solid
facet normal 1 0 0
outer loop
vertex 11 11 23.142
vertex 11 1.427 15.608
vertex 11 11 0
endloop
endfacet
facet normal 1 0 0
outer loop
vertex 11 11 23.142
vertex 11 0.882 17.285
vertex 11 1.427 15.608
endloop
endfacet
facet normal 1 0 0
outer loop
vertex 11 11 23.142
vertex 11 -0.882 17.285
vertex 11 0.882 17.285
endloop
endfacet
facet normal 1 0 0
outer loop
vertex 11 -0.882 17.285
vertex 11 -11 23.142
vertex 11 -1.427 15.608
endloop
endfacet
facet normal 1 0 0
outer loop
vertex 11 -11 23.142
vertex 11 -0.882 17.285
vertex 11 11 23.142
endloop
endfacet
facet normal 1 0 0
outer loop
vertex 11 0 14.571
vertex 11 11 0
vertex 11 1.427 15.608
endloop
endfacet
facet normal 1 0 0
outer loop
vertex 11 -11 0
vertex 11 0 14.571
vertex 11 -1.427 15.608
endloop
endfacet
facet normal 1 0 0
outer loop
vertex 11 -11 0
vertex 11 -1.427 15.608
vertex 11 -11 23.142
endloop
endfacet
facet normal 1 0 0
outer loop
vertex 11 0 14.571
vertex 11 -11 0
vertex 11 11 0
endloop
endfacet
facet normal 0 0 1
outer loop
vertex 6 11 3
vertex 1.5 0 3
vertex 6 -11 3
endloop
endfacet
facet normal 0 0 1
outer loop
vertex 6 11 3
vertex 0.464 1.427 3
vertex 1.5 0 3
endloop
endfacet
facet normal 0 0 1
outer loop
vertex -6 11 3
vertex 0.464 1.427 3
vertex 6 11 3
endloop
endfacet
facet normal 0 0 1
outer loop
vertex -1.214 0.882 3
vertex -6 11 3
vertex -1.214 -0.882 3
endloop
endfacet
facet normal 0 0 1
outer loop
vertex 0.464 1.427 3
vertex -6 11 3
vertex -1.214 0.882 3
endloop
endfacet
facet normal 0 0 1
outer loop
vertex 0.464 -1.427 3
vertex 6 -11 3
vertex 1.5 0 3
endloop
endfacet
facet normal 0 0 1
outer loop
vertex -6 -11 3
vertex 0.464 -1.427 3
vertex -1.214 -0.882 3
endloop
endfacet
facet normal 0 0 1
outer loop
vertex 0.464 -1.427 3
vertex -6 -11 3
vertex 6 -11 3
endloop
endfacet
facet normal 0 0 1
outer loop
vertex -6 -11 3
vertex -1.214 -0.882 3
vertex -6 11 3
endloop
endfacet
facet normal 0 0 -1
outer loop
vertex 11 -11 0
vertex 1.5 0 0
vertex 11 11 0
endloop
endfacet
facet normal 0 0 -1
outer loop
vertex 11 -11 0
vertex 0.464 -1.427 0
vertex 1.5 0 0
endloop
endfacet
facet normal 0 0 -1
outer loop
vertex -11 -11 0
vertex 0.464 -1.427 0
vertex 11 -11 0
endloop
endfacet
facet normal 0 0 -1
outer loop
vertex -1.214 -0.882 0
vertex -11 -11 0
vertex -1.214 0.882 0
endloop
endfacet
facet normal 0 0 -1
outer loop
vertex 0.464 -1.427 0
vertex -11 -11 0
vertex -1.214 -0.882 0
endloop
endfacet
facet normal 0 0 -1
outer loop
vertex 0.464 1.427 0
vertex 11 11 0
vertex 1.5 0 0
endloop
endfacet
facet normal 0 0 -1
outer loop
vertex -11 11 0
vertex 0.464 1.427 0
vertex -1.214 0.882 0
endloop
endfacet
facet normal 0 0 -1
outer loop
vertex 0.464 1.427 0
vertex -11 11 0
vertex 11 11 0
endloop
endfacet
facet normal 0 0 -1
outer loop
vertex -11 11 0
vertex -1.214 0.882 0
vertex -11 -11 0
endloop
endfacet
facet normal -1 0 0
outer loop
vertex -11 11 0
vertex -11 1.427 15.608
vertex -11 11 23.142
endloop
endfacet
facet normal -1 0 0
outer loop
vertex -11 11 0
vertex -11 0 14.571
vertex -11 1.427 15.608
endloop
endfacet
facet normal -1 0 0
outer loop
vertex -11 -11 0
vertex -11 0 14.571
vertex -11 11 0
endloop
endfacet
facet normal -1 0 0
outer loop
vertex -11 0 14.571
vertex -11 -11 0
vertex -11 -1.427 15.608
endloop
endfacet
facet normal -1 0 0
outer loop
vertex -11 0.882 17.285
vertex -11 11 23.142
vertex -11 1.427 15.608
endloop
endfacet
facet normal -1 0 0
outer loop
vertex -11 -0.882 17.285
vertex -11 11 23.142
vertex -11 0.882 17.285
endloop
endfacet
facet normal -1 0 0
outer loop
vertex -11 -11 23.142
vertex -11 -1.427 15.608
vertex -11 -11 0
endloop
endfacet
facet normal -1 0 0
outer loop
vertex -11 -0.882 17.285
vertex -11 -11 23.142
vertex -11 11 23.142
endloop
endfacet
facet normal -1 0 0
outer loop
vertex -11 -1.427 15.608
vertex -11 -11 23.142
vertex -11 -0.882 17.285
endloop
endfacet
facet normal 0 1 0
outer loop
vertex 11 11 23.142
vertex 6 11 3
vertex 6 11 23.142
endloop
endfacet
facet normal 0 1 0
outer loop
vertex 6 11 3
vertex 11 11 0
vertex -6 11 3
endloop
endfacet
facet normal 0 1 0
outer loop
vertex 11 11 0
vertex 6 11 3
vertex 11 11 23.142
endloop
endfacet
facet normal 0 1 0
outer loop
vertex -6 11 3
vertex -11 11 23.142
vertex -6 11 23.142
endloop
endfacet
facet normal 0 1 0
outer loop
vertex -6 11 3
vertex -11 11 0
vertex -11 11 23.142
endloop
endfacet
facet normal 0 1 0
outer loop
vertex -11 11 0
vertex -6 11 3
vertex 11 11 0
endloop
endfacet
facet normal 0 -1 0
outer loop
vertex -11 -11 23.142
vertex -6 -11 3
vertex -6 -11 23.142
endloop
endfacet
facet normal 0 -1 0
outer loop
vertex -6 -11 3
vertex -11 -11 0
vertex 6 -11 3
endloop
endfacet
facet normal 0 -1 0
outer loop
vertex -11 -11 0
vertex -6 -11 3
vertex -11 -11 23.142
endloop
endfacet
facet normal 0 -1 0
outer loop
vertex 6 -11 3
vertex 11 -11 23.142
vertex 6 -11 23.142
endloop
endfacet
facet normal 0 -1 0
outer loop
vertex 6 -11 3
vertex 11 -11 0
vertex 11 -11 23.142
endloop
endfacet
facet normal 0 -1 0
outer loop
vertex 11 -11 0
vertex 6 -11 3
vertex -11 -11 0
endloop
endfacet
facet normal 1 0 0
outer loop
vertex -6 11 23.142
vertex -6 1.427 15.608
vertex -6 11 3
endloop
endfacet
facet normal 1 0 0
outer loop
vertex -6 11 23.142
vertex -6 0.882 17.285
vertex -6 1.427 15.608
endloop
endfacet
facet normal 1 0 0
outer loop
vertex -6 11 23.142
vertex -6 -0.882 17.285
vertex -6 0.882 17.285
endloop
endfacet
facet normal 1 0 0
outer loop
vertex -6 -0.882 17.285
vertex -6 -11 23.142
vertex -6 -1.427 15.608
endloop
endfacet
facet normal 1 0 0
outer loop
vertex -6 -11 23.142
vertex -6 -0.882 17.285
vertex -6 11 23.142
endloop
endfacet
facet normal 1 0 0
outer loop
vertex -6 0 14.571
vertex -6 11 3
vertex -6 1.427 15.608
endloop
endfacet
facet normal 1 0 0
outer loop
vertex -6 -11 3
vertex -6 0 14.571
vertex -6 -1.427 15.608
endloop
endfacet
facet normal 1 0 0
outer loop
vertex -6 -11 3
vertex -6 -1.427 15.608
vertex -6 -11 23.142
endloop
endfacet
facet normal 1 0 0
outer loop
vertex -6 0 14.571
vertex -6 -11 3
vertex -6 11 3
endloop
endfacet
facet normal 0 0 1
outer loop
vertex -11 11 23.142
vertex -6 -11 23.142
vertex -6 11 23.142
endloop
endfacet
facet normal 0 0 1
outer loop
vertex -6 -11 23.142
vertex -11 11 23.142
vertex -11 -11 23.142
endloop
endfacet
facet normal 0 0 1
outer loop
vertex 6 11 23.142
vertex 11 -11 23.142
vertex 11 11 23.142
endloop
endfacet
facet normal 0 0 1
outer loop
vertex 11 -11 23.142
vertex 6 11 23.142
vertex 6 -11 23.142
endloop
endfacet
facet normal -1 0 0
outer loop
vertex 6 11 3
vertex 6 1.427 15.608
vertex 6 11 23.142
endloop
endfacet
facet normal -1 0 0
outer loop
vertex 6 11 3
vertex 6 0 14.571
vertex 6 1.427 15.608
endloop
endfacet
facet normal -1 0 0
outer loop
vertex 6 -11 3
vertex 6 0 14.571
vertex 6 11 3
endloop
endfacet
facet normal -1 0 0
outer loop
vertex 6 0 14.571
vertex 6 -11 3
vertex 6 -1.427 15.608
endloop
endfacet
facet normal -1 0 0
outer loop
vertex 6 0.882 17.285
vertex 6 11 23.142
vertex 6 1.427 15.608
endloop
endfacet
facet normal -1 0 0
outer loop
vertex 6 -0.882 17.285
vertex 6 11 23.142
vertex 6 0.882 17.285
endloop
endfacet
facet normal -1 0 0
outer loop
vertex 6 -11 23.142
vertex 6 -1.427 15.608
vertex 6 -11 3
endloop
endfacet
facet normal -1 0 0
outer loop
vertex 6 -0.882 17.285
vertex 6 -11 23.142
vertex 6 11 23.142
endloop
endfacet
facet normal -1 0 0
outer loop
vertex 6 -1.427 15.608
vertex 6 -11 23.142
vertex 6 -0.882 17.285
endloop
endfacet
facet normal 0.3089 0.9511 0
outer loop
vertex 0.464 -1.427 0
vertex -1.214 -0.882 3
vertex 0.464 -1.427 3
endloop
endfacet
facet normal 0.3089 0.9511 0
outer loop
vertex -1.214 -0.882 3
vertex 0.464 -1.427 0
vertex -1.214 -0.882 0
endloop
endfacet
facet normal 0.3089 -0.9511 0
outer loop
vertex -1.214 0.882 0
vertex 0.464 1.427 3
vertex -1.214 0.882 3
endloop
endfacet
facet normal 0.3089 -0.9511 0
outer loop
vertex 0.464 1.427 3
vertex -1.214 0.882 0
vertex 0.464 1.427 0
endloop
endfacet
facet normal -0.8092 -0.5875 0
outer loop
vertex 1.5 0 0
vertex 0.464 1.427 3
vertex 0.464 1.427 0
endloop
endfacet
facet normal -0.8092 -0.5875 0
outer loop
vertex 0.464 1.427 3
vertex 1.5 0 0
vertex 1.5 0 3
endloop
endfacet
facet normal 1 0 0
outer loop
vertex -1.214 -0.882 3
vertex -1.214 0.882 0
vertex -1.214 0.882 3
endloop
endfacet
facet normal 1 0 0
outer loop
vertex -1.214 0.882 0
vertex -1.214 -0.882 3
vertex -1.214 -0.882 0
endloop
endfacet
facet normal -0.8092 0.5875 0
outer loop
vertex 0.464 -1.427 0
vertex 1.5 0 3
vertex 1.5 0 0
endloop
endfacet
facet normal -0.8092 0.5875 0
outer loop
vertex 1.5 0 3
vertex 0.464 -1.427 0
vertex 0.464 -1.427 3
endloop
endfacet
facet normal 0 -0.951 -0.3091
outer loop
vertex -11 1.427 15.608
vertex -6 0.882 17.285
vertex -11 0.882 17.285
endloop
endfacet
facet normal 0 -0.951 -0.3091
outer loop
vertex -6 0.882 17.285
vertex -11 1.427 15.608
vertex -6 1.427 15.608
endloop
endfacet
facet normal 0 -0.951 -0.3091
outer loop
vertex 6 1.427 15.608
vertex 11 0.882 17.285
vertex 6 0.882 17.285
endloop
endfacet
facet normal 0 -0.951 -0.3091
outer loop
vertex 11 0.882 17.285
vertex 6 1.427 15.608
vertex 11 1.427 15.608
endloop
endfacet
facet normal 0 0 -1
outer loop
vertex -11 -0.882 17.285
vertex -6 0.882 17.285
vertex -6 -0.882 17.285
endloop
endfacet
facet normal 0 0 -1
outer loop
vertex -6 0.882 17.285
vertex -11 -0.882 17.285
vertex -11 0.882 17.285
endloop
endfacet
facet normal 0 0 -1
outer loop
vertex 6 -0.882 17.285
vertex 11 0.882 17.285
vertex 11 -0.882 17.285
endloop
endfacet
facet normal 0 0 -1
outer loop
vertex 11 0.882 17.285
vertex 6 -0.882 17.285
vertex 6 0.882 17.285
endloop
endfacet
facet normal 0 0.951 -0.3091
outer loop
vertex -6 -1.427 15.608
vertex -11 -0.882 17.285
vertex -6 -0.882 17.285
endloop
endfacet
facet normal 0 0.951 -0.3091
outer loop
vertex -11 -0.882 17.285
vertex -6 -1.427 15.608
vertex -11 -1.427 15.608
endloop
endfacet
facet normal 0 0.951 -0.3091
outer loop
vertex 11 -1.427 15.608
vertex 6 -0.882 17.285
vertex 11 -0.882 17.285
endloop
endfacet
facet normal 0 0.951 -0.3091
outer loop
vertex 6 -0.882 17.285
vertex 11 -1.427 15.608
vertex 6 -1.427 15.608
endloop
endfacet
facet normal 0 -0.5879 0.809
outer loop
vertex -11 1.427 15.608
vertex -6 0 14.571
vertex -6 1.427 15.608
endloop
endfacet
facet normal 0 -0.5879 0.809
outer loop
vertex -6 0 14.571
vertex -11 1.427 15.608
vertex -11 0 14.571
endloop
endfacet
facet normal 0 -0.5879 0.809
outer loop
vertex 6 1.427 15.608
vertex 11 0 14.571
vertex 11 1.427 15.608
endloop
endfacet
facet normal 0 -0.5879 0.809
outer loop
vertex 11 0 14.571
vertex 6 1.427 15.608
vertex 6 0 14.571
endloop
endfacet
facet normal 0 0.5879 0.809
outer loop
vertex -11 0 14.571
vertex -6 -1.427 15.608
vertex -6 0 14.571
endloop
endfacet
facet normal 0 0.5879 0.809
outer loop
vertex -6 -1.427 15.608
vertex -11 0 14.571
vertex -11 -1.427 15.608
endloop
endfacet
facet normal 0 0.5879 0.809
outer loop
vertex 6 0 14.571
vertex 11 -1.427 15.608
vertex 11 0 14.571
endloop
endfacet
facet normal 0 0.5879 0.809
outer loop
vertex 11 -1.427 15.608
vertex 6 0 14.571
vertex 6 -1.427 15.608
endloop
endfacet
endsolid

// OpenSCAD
// PS3Eye Pan and Tilt Mount
// Tiago Serra, Joel Belouet, Catarina Mota
// serratiago@gmail.com, joel.belouet@neuf.fr, catarinamfmota@gmail.com, 
// Creative Commons Attribution Share Alike
// 20100620

//camBox
camBoxWall=3;
camBoxHeight=80+camBoxWall*2;
camBoxWidth=60+camBoxWall*2;
camBoxDepth=20+camBoxWall;
camBoxRad=10; //radius of cam lens hole

//camPole
poleSide=10;
poleLength=80;

//camAttach
boltHeadHeigh=4;
poleFriction=2;
poleSupportWidth=5;

//bolt
boltRad=1.5;

//----------------------

//camBox();
//camLid();
camAttach();
//camPole();

//----------------------

module camAttach() {
	rotation= sqrt(pow(poleSide/2,2)+pow(poleSide/2,2));
	echo(rotation);
	sideHeight=boltHeadHeigh+rotation*2+poleFriction;
	baseLength=poleSide+poleFriction+poleSupportWidth*2;

	difference(){
		union(){
			translate([0,0,camBoxWall/2]) box(poleSide+poleFriction+poleSupportWidth*2,poleSide+camBoxWall*4,camBoxWall);
			translate([-baseLength/2+poleSupportWidth/2,0,sideHeight/2+camBoxWall]) box(poleSupportWidth,poleSide+camBoxWall*4,sideHeight);
			translate([baseLength/2-poleSupportWidth/2,0,sideHeight/2+camBoxWall]) box(poleSupportWidth,poleSide+camBoxWall*4,sideHeight);
		}
		translate([0,0,-sideHeight/2]) cylinder(sideHeight,boltRad,boltRad);
		#translate([-baseLength,0,boltHeadHeigh+rotation+2+camBoxWall]) rotate([0,90,0]) cylinder(baseLength*2,boltRad,boltRad);
	}
}

module camPole() {
	difference(){
		box(poleLength,poleSide, poleSide);
		translate([-poleLength/2+poleSide/2,0,-poleSide]) cylinder(poleSide*2,boltRad, boltRad);
		rotate([90,0,0]) translate([poleLength/2-poleSide/2,0,-poleSide]) cylinder(poleSide*2,boltRad, boltRad);		
	}
}


module camBox() {
	difference(){
		box(camBoxWidth,camBoxHeight,camBoxDepth);
			translate([0,0,camBoxWall/2]){
				box(camBoxWidth-camBoxWall*2,camBoxHeight-camBoxWall*2,camBoxDepth);
			}
			#translate([0,0,-camBoxDepth]) cylinder(camBoxDepth, camBoxRad, camBoxRad);
	}
}

module camLid() {
	difference(){
		union(){
			translate([0,0,camBoxWall/2]) box(camBoxWidth,camBoxHeight,camBoxWall);
			translate([0,0,camBoxWall*1.5]) box(camBoxWidth-camBoxWall*2,camBoxHeight-camBoxWall*2,camBoxWall*3);
		}
		#translate([0,0,-camBoxDepth/2]) cylinder(camBoxDepth, camBoxRad, camBoxRad);
	}
}


//----------------------
//box(width, height, depth);
//hollowBox(w,h,d,wall);
//roundedBox(width, height, depth, factor);
//cone(height, radius);
//oval(width, height, depth);
//tube(height, radius, wall);
//ovalTube(width, height, depth, wall);
//tearDrop(diam);
//hexagon(height, depth);
//octagon(height, depth);
//dodecagon(height, depth);
//hexagram(height, depth);
//rightTriangle(adjacent, opposite, depth);
//equiTriangle(side, depth);
//12ptStar(height, depth);

//----------------------

module box(w,h,d) {
	scale ([w,h,d]) cube(1, true);
}

module hollowBox(w,h,d,wall){
	difference(){
		box(w,h,d);
		box(w-wall*2,h-wall*2,d);
	}
}

module roundedBox(w,h,d,f){
	difference(){
		box(w,h,d);
		translate([-w/2,h/2,0]) cube(w/(f/2),true);
		translate([w/2,h/2,0]) cube(w/(f/2),true);
		translate([-w/2,-h/2,0]) cube(w/(f/2),true);
		translate([w/2,-h/2,0]) cube(w/(f/2),true);
	}
	translate([-w/2+w/f,h/2-w/f,-d/2]) cylinder(d,w/f, w/f);
	translate([w/2-w/f,h/2-w/f,-d/2]) cylinder(d,w/f, w/f);
	translate([-w/2+w/f,-h/2+w/f,-d/2]) cylinder(d,w/f, w/f);
	translate([w/2-w/f,-h/2+w/f,-d/2]) cylinder(d,w/f, w/f);
}

module cone(height, radius) {
		cylinder(height, radius, 0);
}

module oval(w,h,d) {
	scale ([w/100, h/100, 1]) cylinder(d, 50, 50);
}

module tube(height, radius, wall) {
	difference(){
		cylinder(height, radius, radius);
		cylinder(height, radius-wall, radius-wall);
	}
}

module ovalTube(w,h,d,wall) {
	difference(){
		scale ([w/100, h/100, 1]) cylinder(d, 50, 50);
		scale ([w/100, h/100, 1]) cylinder(d, 50-wall, 50-wall);
	}
}


module tearDrop(diam) {
	f=0.52;
	union(){
		translate([0,diam*0.70,depth/2]) rotate([0,0,135]) rightTriangle(diam*f,diam*f, depth);
		cylinder(depth,diam/2,diam/2);
	}
}

module hexagon(height, depth) {
	boxWidth=height/1.75;
		union(){
			box(boxWidth, height, depth);
			rotate([0,0,60]) box(boxWidth, height, depth);
			rotate([0,0,-60]) box(boxWidth, height, depth);
		}
}

module octagon(height, depth) {
	intersection(){
		box(height, height, depth);
		rotate([0,0,45]) box(height, height, depth);
	}
}

module dodecagon(height, depth) {
	intersection(){
		hexagon(height, depth);
		rotate([0,0,90]) hexagon(height, depth);
	}
}

module hexagram(height, depth) {
	boxWidth=height/1.75;
	intersection(){
		box(height, boxWidth, depth);
		rotate([0,0,60]) box(height, boxWidth, depth);
	}
	intersection(){
		box(height, boxWidth, depth);
		rotate([0,0,-60]) box(height, boxWidth, depth);
	}
	intersection(){
		rotate([0,0,60]) box(height, boxWidth, depth);
		rotate([0,0,-60]) box(height, boxWidth, depth);
	}
}

module rightTriangle(adjacent, opposite, depth) {
	difference(){
		translate([-adjacent/2,opposite/2,0]) box(adjacent, opposite, depth);
		translate([-adjacent,0,0]){
			rotate([0,0,atan(opposite/adjacent)]) dislocateBox(adjacent*2, opposite, depth);
		}
	}
}

module equiTriangle(side, depth) {
	difference(){
		translate([-side/2,side/2,0]) box(side, side, depth);
		rotate([0,0,30]) dislocateBox(side*2, side, depth);
		translate([-side,0,0]){
			rotate([0,0,60]) dislocateBox(side*2, side, depth);
		}
	}
}

module 12ptStar(height, depth) {
	starNum=3;
	starAngle=360/starNum;
	for (s=[1:starNum]){
		rotate([0, 0, s*starAngle]) box(height, height, depth);
	}
}
